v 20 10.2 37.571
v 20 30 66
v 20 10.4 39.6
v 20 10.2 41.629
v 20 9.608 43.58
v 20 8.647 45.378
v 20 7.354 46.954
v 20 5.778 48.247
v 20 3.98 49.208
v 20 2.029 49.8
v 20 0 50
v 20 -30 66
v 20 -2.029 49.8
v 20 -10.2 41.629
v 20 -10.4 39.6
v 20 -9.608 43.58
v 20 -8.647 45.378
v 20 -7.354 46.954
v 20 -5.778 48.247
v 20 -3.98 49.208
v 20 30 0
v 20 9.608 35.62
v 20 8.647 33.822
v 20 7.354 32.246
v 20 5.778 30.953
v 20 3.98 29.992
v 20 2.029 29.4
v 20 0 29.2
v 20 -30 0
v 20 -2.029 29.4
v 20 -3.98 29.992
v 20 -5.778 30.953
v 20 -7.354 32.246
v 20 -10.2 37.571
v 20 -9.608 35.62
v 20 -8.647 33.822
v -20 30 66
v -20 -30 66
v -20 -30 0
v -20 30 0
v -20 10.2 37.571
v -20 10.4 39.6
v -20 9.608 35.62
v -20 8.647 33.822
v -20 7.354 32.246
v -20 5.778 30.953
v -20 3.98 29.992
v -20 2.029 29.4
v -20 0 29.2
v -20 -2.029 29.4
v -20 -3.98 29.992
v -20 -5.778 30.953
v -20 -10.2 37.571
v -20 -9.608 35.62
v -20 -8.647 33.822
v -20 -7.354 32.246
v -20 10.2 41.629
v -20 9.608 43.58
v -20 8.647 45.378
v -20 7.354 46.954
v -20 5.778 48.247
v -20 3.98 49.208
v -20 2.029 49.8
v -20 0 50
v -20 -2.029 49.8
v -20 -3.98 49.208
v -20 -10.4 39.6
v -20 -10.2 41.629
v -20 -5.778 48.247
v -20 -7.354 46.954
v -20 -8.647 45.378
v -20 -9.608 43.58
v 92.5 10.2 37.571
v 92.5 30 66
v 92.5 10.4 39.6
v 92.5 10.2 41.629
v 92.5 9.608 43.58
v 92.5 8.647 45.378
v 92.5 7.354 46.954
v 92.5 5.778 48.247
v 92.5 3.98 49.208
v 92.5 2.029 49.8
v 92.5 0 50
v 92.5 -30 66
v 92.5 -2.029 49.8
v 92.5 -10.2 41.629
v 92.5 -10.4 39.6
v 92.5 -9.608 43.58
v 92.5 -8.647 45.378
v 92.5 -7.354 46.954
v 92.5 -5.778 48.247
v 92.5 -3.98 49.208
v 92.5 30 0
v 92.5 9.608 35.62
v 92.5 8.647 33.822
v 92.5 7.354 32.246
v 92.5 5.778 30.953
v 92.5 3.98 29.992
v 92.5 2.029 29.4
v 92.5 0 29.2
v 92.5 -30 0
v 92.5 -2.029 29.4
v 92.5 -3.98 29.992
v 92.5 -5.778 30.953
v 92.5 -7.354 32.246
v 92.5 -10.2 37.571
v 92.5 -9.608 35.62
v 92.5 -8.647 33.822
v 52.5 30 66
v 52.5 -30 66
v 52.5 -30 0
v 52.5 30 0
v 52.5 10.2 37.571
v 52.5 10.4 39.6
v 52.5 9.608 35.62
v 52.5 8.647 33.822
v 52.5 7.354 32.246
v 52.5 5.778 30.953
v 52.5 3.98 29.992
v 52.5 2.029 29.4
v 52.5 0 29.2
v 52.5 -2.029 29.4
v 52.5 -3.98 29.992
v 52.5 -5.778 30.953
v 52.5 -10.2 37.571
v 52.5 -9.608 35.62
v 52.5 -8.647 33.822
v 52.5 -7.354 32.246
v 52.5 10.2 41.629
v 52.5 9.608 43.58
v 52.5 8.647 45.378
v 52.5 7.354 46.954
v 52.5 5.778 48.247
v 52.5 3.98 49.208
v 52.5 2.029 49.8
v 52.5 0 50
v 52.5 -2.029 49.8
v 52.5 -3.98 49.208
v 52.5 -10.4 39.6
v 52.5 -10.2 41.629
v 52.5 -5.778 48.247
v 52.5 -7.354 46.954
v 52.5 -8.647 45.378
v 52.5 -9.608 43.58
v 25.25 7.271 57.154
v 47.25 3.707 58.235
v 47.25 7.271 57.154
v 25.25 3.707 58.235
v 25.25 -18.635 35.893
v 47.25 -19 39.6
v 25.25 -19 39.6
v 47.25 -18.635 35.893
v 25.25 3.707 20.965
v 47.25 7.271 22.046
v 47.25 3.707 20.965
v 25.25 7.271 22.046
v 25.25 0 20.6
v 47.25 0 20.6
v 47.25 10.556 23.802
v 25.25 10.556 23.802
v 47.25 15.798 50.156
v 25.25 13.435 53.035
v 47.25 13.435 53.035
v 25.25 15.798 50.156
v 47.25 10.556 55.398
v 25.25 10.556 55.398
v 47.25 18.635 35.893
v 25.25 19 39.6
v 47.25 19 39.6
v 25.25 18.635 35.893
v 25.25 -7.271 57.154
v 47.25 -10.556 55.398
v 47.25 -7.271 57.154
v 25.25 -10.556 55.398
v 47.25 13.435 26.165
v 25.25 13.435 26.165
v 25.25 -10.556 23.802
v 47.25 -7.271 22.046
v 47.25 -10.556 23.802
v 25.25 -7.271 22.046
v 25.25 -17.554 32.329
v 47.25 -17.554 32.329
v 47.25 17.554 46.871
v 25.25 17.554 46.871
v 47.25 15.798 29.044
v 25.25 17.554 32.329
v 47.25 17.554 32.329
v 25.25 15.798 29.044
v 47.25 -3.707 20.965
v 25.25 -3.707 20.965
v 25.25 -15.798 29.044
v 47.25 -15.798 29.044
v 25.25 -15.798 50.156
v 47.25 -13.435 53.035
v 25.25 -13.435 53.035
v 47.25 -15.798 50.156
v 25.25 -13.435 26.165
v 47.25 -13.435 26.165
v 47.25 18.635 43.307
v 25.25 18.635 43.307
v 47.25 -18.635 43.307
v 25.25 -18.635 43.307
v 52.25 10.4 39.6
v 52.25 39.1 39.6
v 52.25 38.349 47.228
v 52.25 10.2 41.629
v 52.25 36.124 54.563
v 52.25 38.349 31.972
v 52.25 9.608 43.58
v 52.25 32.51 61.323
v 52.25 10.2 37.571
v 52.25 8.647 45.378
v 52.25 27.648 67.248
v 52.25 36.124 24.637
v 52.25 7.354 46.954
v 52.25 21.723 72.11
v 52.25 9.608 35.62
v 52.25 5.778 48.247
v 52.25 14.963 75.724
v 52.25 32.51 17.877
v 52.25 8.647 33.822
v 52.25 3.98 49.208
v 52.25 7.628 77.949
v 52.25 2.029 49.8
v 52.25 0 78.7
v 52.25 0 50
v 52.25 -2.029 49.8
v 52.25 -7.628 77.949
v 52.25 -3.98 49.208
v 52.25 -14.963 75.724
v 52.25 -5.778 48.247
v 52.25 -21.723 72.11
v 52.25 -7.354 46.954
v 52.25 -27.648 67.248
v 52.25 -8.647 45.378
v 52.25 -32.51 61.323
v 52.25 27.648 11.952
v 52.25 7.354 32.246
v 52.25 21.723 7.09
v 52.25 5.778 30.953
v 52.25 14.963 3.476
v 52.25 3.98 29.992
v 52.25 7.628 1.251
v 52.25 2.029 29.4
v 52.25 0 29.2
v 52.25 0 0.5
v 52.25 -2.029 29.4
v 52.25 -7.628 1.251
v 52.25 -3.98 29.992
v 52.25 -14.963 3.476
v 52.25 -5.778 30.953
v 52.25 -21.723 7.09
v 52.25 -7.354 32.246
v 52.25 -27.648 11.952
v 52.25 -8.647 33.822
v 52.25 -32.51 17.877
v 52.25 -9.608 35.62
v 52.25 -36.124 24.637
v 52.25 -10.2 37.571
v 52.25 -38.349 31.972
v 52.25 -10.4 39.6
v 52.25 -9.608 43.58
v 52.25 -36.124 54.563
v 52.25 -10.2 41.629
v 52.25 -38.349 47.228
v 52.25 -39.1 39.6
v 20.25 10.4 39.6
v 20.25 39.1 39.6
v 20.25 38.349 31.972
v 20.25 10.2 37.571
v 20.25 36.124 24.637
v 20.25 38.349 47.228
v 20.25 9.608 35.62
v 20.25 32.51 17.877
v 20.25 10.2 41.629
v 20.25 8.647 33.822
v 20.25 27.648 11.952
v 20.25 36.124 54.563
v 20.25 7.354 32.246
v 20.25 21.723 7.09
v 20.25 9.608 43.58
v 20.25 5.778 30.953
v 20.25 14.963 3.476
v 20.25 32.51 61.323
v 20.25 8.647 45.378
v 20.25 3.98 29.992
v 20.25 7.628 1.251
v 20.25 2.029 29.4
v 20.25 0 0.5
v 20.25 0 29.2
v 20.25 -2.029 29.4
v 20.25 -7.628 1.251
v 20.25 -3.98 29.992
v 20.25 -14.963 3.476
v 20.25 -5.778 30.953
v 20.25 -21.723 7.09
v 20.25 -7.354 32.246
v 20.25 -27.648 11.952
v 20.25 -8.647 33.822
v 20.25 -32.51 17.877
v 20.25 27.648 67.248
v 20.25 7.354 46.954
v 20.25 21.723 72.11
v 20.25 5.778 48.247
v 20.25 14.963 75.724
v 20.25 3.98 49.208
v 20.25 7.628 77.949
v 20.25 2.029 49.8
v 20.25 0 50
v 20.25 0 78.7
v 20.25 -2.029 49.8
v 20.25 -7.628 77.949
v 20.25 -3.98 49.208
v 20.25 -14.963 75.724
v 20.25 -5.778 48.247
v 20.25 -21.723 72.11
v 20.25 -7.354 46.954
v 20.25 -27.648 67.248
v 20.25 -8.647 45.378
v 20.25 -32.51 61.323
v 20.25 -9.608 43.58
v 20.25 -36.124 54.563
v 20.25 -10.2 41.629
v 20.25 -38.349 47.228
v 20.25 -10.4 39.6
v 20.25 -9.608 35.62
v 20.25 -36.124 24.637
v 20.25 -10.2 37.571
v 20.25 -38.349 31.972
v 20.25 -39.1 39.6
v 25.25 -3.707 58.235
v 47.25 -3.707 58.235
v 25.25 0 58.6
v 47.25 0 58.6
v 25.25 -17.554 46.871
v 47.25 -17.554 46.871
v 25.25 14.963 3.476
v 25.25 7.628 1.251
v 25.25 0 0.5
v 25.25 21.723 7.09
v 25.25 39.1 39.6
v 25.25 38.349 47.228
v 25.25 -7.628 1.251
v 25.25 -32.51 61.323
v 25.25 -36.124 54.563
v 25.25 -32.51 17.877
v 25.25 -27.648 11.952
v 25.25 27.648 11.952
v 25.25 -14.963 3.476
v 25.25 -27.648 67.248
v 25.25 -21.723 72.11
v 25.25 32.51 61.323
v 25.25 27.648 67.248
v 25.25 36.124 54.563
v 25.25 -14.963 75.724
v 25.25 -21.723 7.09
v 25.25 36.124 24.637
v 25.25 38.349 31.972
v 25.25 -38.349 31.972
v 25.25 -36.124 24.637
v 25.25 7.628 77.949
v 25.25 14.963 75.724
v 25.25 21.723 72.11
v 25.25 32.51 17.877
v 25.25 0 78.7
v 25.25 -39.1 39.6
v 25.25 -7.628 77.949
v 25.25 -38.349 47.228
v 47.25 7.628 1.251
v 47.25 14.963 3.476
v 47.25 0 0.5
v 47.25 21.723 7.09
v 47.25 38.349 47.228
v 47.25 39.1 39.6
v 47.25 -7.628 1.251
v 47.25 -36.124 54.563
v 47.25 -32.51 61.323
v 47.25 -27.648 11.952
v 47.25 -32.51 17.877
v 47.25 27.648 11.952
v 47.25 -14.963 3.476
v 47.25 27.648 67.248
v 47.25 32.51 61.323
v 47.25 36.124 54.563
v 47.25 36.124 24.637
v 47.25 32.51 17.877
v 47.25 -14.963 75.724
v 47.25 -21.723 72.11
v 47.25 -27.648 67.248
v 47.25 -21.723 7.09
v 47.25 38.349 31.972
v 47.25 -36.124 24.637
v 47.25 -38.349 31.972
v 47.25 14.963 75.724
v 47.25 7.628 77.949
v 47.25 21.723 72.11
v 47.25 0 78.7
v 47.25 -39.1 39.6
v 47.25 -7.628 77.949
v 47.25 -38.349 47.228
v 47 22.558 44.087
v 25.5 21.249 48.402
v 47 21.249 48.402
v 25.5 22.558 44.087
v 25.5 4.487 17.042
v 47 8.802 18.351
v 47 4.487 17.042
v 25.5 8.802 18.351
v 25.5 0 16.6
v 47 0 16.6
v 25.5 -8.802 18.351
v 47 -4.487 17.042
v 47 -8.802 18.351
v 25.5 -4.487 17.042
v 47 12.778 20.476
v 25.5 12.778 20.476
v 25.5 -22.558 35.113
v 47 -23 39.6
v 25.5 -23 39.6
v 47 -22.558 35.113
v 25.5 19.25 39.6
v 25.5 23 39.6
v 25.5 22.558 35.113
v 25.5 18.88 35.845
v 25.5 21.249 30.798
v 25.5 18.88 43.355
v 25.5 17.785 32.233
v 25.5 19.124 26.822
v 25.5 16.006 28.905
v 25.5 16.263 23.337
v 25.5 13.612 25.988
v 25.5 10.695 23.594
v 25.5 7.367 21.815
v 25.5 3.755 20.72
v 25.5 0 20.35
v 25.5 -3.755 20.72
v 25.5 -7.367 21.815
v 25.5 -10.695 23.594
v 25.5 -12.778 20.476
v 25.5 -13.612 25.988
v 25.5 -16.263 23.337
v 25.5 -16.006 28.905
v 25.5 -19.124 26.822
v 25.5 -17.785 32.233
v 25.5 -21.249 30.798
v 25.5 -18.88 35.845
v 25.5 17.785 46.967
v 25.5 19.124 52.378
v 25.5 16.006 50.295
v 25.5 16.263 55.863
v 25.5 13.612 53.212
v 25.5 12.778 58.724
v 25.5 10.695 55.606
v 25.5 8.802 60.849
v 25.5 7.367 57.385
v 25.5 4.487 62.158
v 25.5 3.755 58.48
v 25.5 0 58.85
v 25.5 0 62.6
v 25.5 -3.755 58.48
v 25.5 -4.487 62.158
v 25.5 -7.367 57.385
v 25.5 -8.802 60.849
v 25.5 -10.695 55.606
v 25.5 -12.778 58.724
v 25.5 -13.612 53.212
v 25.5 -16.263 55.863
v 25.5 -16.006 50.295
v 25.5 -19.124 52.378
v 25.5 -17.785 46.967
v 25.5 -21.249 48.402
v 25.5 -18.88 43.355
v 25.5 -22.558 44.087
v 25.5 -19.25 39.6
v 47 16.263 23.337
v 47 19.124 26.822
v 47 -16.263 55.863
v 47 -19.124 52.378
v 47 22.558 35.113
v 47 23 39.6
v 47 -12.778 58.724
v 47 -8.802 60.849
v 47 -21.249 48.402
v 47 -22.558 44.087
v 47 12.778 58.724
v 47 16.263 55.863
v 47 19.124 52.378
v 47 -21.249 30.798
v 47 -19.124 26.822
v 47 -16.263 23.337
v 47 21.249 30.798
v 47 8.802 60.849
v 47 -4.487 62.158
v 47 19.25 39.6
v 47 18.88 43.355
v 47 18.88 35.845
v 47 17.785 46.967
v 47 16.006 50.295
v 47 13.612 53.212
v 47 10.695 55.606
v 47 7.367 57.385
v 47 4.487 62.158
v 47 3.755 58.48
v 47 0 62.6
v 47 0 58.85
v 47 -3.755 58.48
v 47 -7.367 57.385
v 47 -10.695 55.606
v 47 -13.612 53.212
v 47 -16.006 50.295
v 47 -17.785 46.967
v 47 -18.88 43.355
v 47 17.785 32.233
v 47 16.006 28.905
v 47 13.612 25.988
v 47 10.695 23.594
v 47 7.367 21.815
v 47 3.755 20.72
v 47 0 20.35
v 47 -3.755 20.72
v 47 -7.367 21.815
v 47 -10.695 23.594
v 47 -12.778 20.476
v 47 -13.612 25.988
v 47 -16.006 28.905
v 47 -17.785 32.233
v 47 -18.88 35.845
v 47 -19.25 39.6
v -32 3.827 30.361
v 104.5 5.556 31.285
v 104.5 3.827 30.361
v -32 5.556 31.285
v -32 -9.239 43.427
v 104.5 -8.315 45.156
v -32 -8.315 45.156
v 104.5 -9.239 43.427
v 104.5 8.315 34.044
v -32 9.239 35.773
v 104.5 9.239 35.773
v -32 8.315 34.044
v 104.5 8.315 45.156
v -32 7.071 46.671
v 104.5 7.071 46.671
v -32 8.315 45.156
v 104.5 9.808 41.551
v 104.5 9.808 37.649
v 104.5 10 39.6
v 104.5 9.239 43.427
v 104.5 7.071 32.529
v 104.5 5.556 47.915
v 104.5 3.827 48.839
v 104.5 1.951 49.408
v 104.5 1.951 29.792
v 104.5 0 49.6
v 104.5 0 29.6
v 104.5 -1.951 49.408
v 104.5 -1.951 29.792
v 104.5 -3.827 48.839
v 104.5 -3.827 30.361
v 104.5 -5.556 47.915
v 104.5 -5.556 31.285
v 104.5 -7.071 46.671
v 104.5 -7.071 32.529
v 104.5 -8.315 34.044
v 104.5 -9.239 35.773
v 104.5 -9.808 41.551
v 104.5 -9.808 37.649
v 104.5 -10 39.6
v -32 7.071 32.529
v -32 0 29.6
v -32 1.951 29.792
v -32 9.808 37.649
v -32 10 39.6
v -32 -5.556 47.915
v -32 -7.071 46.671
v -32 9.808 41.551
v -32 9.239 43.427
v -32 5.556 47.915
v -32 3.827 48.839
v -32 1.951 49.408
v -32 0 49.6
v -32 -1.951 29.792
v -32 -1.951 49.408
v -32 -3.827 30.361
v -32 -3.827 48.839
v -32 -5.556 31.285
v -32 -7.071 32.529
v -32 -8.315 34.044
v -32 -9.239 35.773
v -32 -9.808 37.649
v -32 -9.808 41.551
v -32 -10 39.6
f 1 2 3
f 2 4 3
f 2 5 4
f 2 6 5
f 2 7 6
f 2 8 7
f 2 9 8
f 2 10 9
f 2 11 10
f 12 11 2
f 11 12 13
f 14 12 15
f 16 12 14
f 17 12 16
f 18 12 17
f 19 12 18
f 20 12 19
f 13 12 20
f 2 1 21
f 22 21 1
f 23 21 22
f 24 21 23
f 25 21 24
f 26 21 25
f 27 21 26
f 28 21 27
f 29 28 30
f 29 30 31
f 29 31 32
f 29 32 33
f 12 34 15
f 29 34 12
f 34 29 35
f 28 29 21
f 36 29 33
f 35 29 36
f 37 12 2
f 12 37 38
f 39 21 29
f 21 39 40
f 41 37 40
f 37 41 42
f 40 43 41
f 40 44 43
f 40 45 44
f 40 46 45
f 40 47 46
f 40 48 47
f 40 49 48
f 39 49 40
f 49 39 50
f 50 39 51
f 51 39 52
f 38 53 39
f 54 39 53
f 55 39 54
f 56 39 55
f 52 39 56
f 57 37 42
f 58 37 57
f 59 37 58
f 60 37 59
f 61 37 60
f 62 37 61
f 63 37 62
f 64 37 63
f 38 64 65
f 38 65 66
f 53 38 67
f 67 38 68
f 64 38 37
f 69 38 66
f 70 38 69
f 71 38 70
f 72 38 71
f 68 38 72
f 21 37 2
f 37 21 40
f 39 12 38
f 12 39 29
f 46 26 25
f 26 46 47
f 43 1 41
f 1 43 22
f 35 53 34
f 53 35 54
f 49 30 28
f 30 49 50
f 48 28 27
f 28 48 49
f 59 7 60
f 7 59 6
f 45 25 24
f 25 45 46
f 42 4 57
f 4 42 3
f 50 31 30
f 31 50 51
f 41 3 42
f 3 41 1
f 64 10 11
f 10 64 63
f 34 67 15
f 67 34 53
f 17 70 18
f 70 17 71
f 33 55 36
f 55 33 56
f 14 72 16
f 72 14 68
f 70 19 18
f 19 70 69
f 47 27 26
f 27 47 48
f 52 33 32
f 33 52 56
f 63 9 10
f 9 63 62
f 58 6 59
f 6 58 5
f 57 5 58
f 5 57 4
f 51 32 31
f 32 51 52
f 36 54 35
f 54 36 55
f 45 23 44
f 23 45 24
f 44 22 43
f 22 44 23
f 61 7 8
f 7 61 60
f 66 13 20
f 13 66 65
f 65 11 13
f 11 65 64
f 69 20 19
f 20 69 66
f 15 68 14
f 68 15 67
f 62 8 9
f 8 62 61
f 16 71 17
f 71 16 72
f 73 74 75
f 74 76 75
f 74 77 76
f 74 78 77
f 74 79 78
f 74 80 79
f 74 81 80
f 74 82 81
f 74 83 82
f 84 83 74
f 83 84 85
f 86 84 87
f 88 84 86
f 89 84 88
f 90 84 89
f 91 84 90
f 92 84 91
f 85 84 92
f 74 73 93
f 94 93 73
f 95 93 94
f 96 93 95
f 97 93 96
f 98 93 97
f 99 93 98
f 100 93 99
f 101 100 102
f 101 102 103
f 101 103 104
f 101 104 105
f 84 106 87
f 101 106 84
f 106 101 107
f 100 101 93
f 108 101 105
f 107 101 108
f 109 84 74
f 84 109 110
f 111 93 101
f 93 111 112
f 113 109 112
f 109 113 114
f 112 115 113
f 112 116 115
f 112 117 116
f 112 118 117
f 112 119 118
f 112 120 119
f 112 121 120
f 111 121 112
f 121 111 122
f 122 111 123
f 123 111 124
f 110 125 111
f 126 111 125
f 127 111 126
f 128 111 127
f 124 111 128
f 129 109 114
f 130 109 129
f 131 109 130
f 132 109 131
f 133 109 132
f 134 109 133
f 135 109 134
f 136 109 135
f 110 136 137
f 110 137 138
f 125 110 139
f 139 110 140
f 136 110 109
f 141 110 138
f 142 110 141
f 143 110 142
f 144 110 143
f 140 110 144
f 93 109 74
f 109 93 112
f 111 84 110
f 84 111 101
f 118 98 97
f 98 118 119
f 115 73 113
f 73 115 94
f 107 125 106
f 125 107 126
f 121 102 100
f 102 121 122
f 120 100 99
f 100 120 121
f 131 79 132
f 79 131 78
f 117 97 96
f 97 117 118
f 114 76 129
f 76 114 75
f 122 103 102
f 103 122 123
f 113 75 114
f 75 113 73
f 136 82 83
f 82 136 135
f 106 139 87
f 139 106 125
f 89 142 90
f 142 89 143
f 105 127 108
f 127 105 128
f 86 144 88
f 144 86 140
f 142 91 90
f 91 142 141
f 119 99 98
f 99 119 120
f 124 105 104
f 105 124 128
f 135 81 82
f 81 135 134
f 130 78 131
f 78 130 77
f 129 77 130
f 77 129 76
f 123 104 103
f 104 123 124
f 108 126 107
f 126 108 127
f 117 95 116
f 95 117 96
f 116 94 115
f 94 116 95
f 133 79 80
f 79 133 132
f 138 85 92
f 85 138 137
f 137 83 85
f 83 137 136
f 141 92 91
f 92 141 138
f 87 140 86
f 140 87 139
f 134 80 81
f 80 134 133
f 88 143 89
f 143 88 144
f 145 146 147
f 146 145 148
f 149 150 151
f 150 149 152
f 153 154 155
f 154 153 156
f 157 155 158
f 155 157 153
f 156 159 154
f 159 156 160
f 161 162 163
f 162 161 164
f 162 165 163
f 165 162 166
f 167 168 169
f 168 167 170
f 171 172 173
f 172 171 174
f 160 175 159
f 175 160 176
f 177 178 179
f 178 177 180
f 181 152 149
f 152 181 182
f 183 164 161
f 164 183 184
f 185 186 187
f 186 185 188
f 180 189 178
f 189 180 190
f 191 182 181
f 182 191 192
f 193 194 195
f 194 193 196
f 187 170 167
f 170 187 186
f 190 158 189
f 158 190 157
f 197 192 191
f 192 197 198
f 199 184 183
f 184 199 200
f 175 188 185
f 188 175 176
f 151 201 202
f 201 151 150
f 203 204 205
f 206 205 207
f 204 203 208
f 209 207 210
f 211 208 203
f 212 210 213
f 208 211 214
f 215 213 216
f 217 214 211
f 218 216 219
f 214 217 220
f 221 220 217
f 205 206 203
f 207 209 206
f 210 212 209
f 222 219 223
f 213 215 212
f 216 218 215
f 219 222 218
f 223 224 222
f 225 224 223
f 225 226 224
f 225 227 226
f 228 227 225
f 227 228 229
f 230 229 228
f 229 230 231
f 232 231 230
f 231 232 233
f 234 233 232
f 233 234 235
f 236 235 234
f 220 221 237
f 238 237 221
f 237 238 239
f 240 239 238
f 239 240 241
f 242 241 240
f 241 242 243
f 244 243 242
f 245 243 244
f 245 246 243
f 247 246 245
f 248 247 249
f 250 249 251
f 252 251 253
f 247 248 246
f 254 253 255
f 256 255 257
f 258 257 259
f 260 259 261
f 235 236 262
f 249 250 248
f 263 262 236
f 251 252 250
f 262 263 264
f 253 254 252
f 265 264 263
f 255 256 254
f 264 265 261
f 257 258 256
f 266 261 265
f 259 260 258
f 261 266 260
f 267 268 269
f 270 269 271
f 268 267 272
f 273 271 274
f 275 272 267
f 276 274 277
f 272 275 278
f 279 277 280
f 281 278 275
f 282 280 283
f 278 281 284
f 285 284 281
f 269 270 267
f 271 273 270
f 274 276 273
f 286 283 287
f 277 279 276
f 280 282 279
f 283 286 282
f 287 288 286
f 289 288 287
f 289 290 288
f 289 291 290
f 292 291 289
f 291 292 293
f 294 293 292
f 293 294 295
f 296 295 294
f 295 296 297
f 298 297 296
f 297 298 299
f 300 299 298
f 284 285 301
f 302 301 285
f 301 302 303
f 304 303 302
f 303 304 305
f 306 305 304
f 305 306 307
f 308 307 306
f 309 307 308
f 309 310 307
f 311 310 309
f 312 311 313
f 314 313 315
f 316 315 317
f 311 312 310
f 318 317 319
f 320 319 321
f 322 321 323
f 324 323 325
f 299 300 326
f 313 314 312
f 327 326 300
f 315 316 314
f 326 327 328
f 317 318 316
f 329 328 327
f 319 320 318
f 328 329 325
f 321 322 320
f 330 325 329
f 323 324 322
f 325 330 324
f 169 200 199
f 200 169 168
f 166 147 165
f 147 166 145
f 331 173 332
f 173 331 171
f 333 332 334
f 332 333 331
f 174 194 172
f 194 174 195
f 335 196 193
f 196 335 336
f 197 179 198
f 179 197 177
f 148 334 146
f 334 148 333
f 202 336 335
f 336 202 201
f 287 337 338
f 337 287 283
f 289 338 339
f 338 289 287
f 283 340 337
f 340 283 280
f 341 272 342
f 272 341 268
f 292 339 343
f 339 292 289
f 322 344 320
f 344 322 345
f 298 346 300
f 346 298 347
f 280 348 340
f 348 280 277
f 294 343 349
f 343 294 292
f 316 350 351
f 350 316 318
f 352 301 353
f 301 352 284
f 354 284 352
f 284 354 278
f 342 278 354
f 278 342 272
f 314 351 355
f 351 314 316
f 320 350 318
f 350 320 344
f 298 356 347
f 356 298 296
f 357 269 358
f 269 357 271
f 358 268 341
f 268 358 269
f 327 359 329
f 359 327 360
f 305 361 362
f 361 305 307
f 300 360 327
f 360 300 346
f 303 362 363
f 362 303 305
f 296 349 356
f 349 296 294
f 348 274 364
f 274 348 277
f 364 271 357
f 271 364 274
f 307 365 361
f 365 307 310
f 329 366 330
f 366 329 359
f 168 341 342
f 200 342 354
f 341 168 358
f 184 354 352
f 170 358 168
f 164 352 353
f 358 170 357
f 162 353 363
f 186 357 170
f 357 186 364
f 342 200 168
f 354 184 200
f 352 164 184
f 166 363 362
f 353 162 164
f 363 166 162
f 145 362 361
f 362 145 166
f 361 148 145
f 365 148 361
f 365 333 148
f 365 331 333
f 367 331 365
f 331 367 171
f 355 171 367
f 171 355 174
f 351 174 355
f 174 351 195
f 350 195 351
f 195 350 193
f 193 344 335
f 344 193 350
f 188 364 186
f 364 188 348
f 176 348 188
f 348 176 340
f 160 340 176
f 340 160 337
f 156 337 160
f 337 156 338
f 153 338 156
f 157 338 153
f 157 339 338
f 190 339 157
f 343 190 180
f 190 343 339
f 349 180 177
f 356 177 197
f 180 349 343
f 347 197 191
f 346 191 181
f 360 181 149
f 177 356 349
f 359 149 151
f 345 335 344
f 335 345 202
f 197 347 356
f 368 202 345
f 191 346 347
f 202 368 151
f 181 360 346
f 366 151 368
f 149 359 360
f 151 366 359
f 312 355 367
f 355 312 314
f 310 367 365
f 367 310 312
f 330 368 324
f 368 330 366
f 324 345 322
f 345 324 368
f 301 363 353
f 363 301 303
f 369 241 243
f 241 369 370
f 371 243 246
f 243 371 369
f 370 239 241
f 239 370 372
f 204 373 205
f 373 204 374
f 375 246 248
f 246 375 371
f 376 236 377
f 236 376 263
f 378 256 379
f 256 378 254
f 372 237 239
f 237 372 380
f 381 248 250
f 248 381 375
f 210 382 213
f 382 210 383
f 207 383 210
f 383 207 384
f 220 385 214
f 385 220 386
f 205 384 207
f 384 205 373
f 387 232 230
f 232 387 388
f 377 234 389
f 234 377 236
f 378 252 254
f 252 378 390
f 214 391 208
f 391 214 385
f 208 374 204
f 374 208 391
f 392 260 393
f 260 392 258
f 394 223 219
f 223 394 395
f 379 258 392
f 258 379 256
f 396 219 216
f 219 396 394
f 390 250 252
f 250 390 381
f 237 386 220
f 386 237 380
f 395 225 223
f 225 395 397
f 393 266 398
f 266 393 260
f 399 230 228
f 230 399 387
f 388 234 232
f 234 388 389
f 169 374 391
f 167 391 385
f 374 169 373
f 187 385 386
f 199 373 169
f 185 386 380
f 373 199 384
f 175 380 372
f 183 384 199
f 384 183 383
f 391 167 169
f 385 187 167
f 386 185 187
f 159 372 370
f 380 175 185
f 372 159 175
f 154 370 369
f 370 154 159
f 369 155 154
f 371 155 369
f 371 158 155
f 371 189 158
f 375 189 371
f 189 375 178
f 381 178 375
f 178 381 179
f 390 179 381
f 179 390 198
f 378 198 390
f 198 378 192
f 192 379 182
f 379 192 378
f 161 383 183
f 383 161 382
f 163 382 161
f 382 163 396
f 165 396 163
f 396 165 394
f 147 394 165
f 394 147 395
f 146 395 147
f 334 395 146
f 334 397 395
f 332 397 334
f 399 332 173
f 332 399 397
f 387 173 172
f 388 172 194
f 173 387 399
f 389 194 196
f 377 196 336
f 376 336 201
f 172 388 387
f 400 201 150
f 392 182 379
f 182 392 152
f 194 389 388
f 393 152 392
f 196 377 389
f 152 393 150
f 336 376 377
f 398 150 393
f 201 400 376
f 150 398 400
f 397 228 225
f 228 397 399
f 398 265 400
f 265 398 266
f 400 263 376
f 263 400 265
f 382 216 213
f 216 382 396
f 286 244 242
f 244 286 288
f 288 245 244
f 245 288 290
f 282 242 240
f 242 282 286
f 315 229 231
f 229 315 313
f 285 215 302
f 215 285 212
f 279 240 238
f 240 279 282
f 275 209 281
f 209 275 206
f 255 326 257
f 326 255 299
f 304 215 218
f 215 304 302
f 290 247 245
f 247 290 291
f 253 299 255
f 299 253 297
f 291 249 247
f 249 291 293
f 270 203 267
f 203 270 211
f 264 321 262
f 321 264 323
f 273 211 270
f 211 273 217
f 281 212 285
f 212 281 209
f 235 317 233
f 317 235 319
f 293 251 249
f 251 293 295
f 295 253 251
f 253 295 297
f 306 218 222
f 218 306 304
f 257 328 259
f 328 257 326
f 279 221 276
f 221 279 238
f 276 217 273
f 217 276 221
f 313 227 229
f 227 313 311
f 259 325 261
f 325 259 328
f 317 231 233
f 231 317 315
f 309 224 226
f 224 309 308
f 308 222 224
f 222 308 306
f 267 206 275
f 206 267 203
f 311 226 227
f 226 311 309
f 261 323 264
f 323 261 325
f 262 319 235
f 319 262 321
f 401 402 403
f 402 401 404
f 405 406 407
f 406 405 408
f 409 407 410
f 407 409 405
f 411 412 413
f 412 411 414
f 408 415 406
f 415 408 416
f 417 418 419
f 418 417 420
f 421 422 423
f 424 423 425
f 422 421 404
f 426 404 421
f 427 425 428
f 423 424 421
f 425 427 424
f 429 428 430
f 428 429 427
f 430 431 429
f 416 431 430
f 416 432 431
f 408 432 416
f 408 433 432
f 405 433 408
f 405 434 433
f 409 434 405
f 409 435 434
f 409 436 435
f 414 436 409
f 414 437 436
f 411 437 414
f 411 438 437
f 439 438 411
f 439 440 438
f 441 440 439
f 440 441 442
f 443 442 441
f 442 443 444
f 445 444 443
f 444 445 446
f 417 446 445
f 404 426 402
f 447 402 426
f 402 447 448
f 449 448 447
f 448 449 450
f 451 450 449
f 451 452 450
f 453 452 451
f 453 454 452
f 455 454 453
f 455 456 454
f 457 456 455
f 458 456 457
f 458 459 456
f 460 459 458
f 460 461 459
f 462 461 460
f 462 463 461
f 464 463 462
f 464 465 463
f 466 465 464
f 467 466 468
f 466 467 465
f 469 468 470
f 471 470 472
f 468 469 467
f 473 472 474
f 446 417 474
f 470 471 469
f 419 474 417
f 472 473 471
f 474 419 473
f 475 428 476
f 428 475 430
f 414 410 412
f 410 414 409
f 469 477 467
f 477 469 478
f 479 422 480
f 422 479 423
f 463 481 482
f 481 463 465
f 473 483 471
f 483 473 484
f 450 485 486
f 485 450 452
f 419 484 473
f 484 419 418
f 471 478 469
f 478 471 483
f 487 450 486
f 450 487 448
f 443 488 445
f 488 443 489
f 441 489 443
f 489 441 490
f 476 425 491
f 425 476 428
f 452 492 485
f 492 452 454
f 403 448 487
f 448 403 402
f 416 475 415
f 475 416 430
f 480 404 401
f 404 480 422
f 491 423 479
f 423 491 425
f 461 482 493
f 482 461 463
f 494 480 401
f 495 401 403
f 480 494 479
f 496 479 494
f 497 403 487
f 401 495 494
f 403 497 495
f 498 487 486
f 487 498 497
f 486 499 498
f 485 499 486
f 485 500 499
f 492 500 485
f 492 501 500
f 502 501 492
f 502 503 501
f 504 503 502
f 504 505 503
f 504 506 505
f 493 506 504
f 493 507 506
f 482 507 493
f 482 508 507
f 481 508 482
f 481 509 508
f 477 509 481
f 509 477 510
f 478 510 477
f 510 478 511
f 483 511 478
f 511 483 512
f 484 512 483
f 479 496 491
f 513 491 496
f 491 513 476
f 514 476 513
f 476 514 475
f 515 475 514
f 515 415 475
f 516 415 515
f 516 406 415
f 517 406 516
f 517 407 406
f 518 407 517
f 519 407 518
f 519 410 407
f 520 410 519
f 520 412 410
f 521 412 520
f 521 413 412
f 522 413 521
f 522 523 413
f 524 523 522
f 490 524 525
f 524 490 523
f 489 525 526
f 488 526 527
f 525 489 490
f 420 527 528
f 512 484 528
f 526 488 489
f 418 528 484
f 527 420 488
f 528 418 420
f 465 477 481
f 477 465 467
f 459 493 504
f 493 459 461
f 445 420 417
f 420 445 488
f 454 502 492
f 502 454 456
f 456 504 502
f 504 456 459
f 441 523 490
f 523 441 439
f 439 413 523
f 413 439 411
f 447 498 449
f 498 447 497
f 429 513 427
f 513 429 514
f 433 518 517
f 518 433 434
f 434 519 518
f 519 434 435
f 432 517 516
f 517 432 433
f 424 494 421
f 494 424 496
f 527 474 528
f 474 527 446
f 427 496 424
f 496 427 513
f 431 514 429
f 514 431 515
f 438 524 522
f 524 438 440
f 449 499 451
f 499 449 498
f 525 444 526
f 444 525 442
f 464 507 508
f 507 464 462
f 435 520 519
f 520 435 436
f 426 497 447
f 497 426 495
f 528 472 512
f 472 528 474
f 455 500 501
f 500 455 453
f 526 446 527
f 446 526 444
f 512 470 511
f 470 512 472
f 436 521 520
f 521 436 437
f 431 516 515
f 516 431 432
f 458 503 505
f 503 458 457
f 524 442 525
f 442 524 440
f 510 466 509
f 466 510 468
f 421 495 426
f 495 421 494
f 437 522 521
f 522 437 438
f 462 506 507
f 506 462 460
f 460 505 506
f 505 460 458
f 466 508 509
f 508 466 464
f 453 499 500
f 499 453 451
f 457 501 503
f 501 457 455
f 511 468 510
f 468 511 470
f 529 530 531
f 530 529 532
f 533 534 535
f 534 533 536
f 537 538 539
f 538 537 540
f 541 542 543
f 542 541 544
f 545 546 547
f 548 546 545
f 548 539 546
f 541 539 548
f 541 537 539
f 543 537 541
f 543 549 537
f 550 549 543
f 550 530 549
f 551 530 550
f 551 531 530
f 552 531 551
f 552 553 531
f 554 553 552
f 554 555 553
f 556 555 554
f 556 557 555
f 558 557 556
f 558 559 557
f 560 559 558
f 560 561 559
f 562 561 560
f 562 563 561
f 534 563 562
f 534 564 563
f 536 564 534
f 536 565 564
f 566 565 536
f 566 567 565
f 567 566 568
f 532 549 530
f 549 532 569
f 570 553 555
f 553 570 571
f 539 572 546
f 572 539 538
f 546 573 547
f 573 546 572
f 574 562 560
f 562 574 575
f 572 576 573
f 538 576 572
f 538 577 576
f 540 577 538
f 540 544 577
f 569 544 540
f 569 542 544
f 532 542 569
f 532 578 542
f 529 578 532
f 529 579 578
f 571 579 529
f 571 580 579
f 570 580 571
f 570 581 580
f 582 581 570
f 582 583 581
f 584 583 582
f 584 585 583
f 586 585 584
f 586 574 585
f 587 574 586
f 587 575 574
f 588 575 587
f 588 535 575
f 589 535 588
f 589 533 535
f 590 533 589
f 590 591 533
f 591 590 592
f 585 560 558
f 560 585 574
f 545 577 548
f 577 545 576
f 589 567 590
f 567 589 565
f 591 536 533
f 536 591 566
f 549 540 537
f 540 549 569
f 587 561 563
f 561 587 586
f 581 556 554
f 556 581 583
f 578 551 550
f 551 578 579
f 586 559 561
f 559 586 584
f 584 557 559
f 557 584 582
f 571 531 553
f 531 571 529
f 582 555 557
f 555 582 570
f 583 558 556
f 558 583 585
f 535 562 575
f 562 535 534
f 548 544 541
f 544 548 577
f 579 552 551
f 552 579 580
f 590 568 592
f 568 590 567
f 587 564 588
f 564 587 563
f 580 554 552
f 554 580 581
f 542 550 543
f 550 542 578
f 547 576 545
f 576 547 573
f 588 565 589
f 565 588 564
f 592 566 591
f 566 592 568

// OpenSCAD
$fn = 32;

// ------------------------------------------------------------------------
// Pulley assembly: d78.2 pulley with a belt, shaft d20
// Every part is its own module, assembly() places them once.
// ------------------------------------------------------------------------

// --- part 1 ---
module support1() {
  difference() {
    translate([-20, -30, 0]) cube([40, 60, 66]);
    translate([0, 0, 39.6]) rotate([0, 90, 0]) cylinder(h = 42, d = 20.8, center = true);
  }
}

// --- part 2 ---
module support2() {
  difference() {
    translate([-20, -30, 0]) cube([40, 60, 66]);
    translate([0, 0, 39.6]) rotate([0, 90, 0]) cylinder(h = 42, d = 20.8, center = true);
  }
}

// --- part 3 ---
module shaft() {
  translate([0, 0, -68.25]) cylinder(h = 136.5, d = 20);
}

// --- part 4 ---
module pulley() {
  difference() {
    union() {
      cylinder(h = 32, d = 38);
      cylinder(h = 5, d = 78.2);
      translate([0, 0, 27]) cylinder(h = 5, d = 78.2);
    }
    translate([0, 0, -1]) cylinder(h = 34, d = 20.8);
  }
}

// --- part 5 ---
module belt() {
  difference() {
      translate([0, 0, 0]) cylinder(h = 21.5, d = 46);
      translate([0, 0, -1]) cylinder(h = 23.5, d = 38.5);
    }
}

// --- assembly ---
module assembly() {
  translate([0, 0, 0]) rotate([0, 0, 0]) support1();
  translate([72.5, 0, 0]) rotate([0, 0, 0]) support2();
  translate([36.25, 0, 39.6]) rotate([0, 90, 0]) shaft();
  translate([20.25, 0, 39.6]) rotate([0, 90, 0]) pulley();
  translate([25.5, 0, 39.6]) rotate([0, 90, 0]) belt();
}

assembly();
